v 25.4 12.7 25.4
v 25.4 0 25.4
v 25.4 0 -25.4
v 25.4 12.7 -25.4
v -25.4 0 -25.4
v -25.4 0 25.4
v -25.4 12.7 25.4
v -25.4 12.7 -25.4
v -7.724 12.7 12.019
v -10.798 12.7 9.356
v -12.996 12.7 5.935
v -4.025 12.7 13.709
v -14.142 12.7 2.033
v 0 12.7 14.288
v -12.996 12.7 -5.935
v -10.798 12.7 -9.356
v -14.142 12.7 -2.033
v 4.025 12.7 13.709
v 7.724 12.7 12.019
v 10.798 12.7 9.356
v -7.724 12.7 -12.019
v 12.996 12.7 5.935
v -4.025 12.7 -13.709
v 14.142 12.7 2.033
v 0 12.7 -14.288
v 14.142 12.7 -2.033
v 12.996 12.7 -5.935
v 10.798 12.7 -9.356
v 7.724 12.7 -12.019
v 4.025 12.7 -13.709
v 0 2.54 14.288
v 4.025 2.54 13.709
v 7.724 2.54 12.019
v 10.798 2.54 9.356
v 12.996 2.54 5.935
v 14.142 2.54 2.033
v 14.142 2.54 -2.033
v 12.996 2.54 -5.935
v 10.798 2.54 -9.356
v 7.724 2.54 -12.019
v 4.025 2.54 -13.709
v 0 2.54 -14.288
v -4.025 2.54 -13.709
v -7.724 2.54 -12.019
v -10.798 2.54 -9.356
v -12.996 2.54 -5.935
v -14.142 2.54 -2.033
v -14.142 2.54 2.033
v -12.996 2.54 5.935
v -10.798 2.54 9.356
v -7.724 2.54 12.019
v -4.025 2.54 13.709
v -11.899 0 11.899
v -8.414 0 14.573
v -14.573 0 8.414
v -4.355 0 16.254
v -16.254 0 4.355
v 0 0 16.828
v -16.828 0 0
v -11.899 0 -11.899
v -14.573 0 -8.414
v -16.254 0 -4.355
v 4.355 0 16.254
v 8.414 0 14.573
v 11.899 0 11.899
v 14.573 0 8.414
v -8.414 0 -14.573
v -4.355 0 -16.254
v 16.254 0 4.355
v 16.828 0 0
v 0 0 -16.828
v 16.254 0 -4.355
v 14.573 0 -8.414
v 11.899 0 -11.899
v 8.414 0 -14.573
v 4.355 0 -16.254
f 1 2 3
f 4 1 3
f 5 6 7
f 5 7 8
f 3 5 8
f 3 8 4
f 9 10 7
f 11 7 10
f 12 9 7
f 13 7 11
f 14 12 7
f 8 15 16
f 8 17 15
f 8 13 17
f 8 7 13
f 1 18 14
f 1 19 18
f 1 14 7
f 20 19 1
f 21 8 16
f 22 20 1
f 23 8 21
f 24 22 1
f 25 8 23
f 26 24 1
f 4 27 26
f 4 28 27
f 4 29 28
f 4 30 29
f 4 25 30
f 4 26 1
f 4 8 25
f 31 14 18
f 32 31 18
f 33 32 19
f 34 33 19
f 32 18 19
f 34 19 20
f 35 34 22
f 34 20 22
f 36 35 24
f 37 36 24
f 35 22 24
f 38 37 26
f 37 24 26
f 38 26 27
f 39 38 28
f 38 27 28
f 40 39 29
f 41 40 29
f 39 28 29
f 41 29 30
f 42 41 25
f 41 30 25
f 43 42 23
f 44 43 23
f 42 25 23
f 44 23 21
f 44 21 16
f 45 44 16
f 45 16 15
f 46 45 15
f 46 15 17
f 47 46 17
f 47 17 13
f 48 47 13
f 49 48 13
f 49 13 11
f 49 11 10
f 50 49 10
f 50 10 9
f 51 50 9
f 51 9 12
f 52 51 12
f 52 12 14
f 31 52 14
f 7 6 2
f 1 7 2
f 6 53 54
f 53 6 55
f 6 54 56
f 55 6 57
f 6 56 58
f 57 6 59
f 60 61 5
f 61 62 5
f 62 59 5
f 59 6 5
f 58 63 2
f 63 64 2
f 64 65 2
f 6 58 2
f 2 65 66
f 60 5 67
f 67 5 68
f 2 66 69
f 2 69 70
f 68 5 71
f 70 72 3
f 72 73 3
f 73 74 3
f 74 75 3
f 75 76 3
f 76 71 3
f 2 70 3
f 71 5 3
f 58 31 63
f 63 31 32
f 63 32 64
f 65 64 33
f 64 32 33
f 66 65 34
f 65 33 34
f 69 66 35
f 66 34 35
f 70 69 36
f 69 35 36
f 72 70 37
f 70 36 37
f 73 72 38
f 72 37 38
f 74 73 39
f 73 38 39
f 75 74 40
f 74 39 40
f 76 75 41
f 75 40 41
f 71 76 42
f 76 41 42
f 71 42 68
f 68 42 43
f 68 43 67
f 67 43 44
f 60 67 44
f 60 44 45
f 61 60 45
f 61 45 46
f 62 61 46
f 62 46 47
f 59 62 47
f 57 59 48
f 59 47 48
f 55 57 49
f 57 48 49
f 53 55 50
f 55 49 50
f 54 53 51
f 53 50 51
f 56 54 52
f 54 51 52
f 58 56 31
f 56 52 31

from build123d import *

# Parameters (mm, degrees)
SKETCH1_W           = 50.8
SKETCH1_H           = 50.8
BOSS_EXTRUDE1_DEPTH = 12.7
CUT_EXTRUDE1_REACH  = 40.1
SKETCH2_R           = 14.2875
CHAMFER1_SIZE       = 2.54


with BuildPart() as part:
    # Sketch1 → Boss-Extrude1 (new body)
    with BuildSketch(Plane(origin=(0, 0, 0), x_dir=(1, 0, 0), z_dir=(0, 1, 0))):
        Rectangle(SKETCH1_W, SKETCH1_H)
    extrude(amount=BOSS_EXTRUDE1_DEPTH)

    # Sketch2 → Cut-Extrude1 (cut, up to next)
    with BuildSketch(Plane(origin=(0, 12.7, 0), x_dir=(1, 0, 0), z_dir=(0, 1, 0)), mode=Mode.PRIVATE) as cut_extrude1_sk1:
        with Locations(Location((0, 0, 0), (0, 0, 270))):
            Circle(SKETCH2_R)
    cut_extrude1_tool1 = extrude(cut_extrude1_sk1.sketch, amount=-CUT_EXTRUDE1_REACH, mode=Mode.PRIVATE) & part.part
    add(cut_extrude1_tool1.solids().sort_by_distance((0, 12.7, 0))[0], mode=Mode.SUBTRACT)

    # Chamfer1
    chamfer1_edges = [part.edges().sort_by_distance(p)[0] for p in [
        (0, 0, -14.2875),
    ]]
    chamfer(chamfer1_edges, length=CHAMFER1_SIZE)


solid = part.part
